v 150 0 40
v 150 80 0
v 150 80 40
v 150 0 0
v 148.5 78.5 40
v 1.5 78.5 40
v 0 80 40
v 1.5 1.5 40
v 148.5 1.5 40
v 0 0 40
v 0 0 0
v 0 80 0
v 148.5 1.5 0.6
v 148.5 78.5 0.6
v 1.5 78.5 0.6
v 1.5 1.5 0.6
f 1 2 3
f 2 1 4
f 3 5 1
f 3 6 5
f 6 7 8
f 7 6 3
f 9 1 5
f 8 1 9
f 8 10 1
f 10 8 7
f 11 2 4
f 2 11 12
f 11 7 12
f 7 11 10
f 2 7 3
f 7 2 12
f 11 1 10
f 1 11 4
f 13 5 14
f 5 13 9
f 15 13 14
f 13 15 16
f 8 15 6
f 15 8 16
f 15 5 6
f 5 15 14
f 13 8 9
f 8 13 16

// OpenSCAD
//cube([200,80,40]);
//cube([160,60,40]);
l=150;
w=80;
h=40;
wall=1.5;
difference() {
    cube([l,w,h]);
    translate([wall,wall,.6]) cube([l-wall*2,w-wall*2,h]);
}
